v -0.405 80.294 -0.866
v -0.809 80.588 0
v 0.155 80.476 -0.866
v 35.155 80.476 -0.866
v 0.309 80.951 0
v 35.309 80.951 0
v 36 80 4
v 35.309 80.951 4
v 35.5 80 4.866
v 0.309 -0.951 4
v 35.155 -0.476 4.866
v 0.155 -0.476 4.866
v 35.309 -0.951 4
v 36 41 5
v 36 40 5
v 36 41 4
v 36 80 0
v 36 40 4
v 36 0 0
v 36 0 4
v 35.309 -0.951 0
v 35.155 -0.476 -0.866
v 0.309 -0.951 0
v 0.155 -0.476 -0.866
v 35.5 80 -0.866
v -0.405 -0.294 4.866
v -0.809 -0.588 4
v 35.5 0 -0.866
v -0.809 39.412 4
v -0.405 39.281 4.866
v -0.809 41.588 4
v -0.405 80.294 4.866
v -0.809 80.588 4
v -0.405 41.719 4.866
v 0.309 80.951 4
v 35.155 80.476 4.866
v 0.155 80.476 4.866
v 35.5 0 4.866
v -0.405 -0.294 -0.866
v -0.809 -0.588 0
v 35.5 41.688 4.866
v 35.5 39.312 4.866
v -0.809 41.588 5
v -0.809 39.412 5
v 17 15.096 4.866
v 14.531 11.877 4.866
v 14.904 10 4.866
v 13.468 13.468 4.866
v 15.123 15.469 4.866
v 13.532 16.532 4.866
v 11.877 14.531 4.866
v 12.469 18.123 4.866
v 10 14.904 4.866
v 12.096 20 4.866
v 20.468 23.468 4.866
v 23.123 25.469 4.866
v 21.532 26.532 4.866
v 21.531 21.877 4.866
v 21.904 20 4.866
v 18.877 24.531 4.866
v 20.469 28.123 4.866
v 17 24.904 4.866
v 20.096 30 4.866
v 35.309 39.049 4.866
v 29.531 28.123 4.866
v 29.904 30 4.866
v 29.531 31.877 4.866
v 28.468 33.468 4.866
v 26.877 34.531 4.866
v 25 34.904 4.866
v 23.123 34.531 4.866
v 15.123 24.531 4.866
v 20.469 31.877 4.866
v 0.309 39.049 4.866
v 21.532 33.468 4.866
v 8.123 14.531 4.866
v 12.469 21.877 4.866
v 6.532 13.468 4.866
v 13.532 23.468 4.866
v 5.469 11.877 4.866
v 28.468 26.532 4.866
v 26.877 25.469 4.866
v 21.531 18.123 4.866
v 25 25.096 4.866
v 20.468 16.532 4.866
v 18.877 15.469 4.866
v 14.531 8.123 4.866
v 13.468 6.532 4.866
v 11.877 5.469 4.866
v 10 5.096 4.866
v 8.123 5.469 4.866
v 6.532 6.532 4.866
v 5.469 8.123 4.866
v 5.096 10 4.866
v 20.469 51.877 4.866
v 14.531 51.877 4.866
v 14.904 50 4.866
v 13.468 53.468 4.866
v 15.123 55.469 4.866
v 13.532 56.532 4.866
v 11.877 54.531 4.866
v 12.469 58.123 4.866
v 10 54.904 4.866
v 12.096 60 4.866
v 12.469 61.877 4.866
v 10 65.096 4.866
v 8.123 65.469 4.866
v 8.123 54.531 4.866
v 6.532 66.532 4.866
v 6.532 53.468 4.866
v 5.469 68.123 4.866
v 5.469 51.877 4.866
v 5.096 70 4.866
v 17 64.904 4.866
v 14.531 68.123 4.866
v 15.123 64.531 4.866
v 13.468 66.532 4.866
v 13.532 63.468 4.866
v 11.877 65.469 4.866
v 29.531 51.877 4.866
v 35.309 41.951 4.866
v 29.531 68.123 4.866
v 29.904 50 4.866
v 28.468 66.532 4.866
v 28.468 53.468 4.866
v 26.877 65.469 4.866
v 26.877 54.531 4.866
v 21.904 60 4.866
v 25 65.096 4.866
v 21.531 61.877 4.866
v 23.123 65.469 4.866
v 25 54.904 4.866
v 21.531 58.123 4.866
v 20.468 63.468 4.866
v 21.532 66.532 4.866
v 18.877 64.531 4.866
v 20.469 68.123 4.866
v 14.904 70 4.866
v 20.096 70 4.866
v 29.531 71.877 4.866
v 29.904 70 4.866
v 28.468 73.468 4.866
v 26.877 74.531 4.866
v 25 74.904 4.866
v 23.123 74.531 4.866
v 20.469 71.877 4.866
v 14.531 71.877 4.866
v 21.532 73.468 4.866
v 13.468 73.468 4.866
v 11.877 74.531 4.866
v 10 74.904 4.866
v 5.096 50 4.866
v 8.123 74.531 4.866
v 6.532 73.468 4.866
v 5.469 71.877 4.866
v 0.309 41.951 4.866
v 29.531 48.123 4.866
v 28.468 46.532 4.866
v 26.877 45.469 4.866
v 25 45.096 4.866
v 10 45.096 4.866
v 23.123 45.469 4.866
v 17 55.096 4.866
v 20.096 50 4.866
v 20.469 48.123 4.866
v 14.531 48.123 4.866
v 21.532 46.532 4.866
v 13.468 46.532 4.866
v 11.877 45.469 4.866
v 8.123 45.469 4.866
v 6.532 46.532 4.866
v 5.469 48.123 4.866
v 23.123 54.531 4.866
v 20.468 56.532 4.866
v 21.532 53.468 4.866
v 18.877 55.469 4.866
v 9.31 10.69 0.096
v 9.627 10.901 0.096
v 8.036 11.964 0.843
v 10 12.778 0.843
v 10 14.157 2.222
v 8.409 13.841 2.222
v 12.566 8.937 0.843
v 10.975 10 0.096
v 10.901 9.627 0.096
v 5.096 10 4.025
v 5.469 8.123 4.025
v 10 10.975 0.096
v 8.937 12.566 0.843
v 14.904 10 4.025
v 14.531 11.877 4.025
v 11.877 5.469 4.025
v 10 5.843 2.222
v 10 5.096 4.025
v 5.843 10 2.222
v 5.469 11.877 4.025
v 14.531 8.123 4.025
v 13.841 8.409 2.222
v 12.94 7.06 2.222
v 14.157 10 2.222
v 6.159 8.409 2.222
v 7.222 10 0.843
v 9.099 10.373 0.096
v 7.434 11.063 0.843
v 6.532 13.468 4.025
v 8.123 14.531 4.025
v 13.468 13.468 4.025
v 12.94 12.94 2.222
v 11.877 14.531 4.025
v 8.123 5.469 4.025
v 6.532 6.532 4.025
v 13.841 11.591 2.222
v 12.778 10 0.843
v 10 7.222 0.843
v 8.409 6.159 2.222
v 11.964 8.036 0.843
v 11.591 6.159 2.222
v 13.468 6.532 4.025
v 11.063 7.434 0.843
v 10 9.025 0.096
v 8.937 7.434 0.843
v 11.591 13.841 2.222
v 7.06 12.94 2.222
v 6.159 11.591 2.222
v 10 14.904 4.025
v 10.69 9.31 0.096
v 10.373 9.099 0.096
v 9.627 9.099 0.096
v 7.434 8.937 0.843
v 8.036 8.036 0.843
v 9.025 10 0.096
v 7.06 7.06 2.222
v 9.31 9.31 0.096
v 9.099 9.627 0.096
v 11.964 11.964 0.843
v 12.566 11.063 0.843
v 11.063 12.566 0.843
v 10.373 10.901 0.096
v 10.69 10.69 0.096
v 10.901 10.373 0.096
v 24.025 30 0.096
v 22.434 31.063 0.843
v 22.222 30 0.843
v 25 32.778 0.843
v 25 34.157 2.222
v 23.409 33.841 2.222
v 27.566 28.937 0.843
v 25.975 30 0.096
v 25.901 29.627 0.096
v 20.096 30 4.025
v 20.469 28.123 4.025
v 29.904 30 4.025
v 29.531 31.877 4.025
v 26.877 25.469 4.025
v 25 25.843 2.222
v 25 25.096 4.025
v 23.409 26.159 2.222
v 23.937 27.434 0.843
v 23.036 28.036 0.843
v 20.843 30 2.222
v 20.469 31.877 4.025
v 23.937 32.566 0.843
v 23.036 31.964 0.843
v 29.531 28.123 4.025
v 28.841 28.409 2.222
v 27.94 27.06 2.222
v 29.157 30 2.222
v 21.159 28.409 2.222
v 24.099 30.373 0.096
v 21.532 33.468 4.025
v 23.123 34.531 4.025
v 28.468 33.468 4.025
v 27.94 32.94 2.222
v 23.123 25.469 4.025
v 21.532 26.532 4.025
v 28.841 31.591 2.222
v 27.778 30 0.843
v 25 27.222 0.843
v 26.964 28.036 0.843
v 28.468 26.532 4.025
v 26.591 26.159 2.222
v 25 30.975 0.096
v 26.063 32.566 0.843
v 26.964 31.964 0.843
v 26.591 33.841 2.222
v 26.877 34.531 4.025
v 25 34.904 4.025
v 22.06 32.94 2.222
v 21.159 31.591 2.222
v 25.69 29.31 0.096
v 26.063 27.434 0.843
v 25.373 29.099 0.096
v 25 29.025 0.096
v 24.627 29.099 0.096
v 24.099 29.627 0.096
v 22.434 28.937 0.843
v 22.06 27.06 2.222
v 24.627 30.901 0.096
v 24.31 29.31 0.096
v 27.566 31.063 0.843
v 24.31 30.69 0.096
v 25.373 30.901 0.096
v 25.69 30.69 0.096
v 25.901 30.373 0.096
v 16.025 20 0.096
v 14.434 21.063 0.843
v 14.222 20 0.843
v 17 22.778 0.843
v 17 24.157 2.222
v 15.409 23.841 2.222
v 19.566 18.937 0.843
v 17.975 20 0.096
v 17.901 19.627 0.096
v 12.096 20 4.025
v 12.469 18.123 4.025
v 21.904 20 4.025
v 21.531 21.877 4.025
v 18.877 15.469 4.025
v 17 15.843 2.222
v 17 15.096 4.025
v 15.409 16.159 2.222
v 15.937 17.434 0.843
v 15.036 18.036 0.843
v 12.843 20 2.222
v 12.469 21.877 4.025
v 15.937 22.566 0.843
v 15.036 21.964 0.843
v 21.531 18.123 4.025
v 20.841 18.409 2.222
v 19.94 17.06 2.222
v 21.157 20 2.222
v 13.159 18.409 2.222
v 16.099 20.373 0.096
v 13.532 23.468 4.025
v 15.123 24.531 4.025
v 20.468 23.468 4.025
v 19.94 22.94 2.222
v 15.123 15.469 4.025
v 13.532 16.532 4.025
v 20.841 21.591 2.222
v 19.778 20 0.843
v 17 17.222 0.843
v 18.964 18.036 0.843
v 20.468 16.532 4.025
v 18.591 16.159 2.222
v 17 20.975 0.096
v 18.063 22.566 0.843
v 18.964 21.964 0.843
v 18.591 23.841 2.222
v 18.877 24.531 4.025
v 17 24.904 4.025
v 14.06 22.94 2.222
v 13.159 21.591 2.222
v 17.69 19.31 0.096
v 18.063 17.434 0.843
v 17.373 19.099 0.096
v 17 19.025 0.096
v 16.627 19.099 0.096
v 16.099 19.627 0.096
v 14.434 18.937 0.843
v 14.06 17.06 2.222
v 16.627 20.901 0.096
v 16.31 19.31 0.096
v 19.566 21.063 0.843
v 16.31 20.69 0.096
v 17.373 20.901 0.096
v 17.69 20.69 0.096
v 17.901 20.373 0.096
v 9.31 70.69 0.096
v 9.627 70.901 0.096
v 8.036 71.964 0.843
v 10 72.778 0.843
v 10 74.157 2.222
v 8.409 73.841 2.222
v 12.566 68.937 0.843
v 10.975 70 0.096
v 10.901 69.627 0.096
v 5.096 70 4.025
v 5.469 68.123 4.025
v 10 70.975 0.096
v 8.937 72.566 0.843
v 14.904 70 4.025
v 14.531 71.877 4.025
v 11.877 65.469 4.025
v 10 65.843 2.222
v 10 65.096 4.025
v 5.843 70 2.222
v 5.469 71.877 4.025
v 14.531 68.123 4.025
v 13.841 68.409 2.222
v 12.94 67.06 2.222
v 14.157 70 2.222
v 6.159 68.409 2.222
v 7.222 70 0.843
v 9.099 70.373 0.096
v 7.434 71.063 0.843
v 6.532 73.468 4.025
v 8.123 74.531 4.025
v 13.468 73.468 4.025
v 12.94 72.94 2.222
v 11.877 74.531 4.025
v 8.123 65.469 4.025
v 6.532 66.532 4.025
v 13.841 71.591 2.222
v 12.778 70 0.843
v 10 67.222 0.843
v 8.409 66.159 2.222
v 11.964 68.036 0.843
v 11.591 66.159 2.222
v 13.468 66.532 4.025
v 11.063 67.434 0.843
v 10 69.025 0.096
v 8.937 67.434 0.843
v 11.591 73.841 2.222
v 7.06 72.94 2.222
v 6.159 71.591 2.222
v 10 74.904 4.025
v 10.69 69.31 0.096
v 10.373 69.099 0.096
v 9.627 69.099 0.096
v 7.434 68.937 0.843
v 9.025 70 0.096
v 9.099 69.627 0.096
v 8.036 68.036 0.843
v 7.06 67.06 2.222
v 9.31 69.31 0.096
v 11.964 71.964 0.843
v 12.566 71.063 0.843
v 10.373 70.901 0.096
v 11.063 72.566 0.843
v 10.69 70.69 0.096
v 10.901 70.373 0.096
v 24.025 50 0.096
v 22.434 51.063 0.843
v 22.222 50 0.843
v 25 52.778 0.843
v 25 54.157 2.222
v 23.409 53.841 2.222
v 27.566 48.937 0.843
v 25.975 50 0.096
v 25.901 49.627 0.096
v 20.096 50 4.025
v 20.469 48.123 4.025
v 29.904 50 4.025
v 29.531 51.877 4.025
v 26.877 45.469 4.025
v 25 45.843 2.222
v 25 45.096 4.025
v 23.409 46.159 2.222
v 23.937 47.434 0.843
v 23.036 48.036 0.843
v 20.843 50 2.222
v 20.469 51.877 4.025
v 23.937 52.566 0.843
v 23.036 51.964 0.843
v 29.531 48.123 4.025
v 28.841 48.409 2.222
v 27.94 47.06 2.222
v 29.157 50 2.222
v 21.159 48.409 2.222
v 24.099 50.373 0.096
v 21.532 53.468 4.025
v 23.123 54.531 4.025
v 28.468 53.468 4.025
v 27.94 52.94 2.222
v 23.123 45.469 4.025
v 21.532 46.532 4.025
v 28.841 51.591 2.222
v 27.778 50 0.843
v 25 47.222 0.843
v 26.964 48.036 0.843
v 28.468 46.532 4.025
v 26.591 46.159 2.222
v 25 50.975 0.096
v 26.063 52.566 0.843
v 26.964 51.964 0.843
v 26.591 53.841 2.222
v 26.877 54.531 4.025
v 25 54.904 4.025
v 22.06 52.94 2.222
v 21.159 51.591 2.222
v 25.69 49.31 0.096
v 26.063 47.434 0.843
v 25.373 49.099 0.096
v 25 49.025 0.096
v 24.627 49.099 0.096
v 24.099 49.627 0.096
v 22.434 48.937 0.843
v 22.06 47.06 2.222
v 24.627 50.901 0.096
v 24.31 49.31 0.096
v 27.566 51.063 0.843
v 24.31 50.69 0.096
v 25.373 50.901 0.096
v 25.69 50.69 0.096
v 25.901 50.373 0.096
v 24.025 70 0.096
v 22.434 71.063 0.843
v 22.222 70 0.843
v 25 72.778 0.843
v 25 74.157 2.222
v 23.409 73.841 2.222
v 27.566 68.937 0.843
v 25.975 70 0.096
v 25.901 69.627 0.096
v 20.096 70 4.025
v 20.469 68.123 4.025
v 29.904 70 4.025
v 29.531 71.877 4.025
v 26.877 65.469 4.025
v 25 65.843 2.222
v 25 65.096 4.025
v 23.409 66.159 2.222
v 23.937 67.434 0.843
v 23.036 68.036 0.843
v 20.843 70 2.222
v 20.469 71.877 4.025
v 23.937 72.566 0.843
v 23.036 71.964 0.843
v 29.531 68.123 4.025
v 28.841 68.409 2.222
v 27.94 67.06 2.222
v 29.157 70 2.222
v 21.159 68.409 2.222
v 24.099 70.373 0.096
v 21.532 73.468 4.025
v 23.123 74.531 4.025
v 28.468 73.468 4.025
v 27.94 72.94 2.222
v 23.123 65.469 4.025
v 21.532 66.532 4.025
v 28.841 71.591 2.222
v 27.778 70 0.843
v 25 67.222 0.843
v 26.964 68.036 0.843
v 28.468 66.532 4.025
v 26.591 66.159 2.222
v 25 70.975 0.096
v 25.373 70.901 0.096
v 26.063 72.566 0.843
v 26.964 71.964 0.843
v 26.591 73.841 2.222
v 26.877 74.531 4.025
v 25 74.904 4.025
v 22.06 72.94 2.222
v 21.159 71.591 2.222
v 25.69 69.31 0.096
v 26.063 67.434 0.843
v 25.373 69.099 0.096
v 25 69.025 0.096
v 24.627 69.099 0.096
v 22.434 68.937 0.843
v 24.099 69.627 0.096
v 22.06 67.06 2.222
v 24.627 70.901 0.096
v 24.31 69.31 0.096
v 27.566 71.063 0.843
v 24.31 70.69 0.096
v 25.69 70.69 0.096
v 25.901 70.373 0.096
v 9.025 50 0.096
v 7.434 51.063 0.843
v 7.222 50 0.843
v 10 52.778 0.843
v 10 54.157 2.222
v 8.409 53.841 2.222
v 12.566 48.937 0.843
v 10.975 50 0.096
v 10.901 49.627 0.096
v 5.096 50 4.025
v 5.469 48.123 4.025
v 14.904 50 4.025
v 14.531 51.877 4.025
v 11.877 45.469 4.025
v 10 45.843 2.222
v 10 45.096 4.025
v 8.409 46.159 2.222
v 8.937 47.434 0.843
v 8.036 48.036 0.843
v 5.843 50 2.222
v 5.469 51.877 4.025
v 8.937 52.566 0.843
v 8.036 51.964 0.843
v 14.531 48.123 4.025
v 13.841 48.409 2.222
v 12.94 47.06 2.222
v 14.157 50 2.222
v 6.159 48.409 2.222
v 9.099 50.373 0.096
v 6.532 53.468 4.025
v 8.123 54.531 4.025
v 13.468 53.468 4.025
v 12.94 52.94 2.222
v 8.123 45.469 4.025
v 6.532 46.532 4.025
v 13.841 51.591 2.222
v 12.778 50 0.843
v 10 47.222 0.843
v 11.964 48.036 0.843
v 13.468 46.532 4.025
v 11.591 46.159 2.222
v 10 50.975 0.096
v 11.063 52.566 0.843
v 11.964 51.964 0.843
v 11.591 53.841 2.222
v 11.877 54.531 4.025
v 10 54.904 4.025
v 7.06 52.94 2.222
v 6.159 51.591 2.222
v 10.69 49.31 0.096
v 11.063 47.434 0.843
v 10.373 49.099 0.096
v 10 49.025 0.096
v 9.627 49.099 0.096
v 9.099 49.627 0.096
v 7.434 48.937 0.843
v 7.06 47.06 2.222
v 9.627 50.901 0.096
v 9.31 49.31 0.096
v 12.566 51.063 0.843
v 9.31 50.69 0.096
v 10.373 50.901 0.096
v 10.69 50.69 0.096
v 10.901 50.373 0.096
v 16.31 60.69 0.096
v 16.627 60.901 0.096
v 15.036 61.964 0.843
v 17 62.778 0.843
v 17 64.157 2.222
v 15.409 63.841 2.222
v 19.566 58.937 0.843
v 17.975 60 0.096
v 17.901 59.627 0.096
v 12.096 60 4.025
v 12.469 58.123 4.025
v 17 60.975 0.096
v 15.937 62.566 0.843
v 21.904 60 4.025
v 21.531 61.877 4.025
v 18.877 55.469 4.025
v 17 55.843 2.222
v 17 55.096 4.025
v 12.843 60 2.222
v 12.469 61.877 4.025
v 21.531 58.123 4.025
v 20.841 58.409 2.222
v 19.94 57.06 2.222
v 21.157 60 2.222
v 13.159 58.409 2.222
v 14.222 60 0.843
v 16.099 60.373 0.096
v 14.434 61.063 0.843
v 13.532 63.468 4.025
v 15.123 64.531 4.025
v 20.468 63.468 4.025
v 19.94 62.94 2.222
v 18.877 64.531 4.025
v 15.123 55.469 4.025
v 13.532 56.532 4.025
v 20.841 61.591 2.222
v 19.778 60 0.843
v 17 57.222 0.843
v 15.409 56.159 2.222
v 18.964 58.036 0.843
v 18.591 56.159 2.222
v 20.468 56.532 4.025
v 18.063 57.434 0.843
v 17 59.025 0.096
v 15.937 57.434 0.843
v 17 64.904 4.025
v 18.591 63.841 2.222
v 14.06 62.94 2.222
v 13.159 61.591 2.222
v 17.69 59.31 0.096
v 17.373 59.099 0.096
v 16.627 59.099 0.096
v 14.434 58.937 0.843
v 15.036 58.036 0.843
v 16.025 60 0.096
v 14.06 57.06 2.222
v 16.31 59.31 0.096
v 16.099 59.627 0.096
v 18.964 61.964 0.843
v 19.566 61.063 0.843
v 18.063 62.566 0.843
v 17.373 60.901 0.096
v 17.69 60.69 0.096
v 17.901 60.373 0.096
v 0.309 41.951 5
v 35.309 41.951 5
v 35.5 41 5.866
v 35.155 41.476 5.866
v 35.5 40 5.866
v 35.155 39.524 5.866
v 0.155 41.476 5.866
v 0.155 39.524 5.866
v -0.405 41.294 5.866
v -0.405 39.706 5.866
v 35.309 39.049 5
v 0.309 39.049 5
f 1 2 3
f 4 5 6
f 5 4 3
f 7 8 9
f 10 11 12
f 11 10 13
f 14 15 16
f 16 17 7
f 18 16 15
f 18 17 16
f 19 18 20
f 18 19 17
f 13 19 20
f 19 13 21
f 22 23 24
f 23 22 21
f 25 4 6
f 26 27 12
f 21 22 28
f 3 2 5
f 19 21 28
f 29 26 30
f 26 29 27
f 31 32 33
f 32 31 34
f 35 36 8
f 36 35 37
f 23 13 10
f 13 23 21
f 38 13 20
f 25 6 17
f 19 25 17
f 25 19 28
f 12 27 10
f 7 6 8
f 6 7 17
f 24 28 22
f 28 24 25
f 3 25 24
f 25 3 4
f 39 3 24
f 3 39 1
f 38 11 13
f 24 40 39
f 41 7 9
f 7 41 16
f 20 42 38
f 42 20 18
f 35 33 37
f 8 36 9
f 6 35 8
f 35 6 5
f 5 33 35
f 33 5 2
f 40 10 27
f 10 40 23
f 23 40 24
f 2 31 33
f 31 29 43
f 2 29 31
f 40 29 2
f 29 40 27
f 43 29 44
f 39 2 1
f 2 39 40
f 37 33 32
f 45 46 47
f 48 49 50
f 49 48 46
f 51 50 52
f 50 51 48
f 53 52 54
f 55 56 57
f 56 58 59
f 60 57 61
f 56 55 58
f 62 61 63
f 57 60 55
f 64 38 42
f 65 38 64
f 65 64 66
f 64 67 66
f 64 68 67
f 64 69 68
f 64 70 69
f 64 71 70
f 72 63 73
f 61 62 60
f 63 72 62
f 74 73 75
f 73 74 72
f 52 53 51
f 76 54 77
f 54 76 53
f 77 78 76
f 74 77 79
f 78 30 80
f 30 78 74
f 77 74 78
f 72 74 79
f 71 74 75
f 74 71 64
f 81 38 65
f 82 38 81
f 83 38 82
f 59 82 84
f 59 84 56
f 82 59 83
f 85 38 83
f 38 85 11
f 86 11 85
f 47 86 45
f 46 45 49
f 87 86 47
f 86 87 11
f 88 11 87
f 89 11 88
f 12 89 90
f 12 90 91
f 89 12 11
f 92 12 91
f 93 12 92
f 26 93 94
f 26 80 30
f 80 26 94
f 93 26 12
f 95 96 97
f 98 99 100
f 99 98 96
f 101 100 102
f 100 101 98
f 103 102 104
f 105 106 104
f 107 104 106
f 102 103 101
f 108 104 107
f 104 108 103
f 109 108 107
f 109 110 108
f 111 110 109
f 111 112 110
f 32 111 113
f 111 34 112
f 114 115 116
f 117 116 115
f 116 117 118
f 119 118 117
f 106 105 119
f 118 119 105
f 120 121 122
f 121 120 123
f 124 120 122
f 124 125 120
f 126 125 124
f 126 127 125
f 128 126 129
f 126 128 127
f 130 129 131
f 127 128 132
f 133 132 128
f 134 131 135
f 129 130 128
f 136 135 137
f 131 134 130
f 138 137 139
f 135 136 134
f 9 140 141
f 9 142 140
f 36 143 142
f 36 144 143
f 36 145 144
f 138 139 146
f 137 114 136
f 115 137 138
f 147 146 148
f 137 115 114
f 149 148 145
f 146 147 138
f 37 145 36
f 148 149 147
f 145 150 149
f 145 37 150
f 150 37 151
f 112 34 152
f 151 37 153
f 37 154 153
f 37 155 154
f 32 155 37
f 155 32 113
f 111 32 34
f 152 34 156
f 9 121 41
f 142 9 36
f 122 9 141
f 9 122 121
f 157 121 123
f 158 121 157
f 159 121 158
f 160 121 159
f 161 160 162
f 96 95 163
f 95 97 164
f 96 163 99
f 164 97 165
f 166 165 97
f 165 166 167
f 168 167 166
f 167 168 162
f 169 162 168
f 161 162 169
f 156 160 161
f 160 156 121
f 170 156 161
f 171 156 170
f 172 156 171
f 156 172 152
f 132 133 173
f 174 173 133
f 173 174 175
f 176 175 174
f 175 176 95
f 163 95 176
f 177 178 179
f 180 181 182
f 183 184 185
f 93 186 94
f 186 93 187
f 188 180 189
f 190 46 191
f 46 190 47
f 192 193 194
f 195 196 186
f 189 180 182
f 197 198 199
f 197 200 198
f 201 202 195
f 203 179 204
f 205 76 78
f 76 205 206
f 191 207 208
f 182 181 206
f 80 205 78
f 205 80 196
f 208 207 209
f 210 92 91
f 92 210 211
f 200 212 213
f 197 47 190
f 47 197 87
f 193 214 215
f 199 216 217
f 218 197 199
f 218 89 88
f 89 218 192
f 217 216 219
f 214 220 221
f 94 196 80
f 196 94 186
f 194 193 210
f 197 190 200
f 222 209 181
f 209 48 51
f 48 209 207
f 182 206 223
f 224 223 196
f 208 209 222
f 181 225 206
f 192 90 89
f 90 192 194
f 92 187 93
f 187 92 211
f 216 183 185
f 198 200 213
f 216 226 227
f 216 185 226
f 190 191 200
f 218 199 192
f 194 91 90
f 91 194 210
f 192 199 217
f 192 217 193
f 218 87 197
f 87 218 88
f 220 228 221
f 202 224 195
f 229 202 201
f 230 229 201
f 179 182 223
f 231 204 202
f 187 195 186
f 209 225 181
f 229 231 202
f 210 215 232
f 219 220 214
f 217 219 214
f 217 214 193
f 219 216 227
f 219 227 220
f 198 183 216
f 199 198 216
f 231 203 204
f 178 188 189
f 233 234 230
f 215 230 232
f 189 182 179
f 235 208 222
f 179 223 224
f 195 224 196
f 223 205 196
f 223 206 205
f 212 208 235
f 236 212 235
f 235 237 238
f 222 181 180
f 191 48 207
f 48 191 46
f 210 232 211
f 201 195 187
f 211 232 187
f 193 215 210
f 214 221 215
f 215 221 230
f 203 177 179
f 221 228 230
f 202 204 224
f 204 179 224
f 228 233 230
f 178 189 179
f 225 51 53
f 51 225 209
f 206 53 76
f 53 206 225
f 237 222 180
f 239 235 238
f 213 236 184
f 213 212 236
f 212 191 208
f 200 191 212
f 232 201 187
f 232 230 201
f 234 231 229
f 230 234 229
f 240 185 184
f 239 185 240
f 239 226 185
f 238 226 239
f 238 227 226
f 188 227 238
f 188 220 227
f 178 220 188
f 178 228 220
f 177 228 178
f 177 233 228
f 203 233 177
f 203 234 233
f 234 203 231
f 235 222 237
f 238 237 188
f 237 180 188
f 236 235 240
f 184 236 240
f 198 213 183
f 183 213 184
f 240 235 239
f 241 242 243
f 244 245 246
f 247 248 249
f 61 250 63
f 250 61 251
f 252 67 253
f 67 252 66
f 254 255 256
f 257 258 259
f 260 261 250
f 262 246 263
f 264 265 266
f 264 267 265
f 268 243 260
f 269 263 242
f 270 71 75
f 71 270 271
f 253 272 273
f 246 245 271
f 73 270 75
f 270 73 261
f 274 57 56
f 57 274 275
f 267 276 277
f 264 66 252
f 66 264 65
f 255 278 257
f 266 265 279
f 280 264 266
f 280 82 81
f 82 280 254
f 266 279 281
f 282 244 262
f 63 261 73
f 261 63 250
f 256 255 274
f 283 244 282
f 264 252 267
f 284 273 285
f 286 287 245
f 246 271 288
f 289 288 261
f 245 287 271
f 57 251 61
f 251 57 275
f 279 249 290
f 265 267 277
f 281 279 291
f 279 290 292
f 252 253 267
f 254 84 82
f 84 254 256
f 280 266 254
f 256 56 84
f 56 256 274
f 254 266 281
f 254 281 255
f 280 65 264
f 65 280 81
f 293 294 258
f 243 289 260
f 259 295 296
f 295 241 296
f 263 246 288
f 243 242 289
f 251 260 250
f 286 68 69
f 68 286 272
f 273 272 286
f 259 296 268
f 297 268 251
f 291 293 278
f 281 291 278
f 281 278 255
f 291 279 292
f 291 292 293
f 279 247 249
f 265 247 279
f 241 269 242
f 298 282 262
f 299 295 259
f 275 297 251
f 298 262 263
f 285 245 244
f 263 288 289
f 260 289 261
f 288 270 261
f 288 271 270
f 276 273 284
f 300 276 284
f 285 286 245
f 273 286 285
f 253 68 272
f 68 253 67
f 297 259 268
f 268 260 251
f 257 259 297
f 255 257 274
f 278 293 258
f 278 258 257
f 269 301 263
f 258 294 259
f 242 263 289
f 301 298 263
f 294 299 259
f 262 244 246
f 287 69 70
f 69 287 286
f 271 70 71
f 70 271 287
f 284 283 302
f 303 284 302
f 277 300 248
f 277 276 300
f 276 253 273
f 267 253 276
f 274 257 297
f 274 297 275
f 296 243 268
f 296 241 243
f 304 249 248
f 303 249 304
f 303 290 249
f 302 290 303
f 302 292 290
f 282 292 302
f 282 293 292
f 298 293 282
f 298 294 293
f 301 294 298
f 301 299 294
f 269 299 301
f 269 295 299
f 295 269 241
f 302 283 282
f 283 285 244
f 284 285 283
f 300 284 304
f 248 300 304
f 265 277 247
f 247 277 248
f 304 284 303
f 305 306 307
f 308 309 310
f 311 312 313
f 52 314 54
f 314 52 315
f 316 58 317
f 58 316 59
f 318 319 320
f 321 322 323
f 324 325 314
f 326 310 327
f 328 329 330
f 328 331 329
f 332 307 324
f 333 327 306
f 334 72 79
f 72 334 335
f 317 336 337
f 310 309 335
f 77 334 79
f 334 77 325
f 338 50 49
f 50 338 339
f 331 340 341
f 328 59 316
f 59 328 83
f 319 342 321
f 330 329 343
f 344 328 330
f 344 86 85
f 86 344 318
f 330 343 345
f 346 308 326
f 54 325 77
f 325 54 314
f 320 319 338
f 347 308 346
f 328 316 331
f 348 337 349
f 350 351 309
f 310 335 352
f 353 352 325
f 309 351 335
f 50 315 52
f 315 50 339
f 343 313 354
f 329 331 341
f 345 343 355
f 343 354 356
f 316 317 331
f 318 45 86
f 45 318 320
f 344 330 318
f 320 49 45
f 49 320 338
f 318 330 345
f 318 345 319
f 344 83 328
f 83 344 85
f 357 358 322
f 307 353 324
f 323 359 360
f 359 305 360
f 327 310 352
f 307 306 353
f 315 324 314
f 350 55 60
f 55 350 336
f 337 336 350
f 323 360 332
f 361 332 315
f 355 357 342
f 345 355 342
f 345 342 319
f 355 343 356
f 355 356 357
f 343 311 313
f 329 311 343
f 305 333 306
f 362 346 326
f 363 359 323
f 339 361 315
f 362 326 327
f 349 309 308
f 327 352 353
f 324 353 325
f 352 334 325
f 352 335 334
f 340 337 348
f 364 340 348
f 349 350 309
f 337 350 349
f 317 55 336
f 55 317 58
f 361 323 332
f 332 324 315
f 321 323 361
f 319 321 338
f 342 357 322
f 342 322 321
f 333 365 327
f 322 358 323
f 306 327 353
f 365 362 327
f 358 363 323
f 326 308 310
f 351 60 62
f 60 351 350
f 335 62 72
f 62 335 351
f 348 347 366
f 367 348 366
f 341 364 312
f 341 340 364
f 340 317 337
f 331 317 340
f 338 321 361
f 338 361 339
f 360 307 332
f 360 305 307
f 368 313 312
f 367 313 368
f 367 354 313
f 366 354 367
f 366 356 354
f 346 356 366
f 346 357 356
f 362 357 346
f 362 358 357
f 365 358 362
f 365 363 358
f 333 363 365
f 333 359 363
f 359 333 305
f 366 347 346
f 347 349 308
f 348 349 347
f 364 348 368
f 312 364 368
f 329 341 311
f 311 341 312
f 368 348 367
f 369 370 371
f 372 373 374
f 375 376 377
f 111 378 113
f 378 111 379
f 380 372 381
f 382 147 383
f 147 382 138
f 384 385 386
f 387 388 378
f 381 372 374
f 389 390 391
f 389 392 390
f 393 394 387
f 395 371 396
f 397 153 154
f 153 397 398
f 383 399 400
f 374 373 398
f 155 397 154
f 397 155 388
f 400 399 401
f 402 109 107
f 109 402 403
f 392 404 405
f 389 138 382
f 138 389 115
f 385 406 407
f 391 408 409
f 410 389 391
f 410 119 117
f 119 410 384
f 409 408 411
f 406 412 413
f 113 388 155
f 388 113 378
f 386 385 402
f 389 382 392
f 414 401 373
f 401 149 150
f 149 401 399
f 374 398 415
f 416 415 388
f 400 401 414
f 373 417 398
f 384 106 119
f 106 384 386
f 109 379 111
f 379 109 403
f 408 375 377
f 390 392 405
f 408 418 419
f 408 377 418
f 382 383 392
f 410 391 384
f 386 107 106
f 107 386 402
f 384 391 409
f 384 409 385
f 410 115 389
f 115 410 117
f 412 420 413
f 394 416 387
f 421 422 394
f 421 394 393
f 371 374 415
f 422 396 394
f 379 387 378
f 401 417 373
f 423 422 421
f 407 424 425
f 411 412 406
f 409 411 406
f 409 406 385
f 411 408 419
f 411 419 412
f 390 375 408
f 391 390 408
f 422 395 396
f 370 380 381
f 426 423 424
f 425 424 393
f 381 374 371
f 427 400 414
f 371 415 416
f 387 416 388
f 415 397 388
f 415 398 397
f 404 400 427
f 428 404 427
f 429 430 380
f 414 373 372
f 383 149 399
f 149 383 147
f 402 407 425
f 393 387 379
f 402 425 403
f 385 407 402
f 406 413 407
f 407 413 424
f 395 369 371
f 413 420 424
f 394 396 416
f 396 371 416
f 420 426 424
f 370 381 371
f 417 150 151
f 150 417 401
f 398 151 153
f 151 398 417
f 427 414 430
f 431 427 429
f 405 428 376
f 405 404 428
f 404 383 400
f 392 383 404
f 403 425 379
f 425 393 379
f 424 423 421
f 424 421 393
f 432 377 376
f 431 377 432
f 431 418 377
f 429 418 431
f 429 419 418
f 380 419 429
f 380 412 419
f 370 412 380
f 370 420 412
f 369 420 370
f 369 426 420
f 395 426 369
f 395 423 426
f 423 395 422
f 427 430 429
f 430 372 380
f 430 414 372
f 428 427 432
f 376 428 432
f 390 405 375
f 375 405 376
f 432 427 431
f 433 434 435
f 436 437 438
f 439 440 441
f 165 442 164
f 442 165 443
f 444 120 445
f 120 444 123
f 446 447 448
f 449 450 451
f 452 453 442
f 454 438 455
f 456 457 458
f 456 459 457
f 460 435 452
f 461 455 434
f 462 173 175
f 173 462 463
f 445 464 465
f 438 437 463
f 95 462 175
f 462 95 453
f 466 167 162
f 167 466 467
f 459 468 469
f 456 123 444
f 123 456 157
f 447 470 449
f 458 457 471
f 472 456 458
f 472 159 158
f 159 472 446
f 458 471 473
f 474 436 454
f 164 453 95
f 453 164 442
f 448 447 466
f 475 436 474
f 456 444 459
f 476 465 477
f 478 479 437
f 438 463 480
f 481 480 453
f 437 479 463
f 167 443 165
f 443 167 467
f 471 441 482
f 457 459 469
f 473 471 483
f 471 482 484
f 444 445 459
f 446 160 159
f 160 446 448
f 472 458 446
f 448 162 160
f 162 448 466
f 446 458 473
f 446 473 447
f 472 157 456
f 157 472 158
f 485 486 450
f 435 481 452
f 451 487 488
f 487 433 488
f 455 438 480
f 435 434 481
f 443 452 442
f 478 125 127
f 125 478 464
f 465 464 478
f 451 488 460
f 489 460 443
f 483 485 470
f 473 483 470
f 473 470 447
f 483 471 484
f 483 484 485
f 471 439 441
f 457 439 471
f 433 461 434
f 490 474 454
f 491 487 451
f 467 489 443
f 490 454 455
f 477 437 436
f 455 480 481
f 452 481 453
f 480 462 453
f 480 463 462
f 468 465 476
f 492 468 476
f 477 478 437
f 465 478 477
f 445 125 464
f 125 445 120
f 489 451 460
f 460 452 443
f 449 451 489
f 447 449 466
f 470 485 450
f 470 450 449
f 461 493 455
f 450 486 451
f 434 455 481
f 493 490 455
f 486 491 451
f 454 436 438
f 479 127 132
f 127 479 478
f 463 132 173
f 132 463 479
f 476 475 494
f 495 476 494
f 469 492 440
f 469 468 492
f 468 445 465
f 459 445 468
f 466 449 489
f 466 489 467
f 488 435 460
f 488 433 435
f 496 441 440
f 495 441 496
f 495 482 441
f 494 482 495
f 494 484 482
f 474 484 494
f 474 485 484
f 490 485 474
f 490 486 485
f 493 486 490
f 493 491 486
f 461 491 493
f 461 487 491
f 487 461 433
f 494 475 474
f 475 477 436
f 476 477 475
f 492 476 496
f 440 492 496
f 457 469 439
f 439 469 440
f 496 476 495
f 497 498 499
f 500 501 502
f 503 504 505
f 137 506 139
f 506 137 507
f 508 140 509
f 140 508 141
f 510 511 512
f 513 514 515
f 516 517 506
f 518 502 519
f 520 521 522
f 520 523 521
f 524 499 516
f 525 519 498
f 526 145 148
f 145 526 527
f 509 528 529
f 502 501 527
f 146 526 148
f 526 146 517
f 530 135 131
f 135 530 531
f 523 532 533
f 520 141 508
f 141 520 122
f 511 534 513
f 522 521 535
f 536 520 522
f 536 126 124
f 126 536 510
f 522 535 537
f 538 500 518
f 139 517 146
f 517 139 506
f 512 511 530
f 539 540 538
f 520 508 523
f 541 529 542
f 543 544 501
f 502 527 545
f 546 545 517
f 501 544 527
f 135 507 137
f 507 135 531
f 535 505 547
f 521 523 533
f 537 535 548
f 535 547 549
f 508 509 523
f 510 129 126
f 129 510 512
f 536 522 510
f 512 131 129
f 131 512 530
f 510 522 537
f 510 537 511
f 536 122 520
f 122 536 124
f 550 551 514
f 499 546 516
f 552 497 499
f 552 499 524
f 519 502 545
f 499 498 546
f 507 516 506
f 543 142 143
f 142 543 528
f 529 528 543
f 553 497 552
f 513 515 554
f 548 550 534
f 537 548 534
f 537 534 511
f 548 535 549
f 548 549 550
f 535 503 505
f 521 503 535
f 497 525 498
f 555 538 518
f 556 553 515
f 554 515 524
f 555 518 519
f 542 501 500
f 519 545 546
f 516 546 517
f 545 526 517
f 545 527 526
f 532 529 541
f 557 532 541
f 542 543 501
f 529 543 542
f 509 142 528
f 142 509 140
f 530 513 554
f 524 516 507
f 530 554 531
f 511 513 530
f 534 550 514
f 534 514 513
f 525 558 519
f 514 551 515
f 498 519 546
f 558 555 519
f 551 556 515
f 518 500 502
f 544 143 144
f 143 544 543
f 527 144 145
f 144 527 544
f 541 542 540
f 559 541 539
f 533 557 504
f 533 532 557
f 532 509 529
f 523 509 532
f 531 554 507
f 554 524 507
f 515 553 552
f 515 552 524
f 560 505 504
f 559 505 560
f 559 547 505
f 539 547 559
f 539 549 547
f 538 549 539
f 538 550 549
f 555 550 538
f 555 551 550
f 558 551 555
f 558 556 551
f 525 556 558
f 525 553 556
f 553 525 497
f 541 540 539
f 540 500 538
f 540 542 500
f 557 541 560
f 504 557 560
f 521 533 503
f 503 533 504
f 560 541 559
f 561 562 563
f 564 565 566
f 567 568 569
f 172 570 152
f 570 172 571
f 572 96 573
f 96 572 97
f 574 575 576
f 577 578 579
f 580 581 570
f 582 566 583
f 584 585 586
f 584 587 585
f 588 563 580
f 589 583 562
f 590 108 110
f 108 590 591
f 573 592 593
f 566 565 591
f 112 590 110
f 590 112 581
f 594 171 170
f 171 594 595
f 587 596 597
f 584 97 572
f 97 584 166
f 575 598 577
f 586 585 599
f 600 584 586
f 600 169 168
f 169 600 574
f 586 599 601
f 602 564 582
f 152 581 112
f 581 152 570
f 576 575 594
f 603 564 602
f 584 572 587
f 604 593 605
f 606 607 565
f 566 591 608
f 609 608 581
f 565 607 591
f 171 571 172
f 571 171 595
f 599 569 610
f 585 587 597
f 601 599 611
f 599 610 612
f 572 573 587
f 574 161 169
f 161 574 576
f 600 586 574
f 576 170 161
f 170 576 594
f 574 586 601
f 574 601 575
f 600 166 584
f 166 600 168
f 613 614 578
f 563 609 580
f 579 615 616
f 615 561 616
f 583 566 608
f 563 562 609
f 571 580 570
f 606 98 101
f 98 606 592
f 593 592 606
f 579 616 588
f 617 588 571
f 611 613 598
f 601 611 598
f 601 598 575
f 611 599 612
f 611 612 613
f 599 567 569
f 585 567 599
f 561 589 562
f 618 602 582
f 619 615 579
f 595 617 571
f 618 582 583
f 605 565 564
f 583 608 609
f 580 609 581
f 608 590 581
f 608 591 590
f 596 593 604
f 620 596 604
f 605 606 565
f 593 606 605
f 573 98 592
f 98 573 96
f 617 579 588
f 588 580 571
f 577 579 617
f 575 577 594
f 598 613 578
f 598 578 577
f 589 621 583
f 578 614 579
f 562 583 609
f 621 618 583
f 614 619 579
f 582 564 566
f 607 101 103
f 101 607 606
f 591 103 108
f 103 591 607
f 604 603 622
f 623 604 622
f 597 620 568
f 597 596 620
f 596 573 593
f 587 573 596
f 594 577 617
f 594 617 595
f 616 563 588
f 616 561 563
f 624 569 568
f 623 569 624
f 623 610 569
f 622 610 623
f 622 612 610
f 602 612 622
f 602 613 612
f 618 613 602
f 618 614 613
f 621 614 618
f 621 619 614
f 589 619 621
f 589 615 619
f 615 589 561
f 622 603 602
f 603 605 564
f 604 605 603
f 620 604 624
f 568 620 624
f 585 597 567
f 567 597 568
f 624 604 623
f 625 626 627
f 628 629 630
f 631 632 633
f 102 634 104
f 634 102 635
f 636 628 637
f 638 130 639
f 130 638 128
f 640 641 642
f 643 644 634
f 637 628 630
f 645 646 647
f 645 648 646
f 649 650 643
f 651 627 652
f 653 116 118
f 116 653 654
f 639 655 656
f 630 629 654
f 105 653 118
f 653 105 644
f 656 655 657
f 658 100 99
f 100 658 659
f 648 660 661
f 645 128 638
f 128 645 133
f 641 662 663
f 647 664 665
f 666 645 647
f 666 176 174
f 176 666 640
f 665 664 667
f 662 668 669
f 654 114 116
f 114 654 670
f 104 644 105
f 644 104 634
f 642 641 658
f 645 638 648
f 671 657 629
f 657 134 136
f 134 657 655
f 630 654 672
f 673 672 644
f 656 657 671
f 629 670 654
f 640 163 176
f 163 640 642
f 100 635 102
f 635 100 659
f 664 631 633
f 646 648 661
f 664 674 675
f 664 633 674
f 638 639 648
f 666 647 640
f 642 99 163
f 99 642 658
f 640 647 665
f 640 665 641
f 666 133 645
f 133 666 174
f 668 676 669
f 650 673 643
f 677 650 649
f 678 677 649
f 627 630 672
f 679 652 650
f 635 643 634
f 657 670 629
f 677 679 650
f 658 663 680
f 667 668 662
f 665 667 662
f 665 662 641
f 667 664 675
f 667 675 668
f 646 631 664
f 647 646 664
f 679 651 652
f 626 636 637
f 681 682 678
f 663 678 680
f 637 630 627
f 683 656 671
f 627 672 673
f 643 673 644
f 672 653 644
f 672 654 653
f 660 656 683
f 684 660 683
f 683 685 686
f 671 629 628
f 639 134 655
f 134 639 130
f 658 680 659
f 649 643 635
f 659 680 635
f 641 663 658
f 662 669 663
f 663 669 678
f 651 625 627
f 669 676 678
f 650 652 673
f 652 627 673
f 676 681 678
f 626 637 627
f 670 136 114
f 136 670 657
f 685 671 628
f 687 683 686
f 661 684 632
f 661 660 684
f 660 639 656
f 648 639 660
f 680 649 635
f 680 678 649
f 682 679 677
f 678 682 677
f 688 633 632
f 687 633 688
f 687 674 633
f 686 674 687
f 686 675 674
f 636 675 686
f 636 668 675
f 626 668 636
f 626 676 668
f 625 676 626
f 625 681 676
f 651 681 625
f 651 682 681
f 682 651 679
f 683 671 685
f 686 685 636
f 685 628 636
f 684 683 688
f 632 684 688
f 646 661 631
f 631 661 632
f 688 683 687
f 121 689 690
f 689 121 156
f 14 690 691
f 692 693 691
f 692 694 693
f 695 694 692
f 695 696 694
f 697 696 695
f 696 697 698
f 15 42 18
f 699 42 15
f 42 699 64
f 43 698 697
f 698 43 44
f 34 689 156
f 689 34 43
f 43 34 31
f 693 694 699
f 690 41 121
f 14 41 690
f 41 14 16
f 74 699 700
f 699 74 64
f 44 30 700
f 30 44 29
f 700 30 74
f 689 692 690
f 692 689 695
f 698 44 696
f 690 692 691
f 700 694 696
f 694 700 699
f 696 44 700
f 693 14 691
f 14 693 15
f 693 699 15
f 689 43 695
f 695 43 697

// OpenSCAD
// Loguncov Maxim 13.12.13


//$fn=128;


translate([0,40,0])
minkowski()
{cube([35,1,5]);
sphere(1);
}

difference() {

//основа
minkowski()
{cube([35,80,4]);
sphere(1);
}

//отверстия
translate([10,10,5])sphere(5);
translate([25,30,5])sphere(5);
translate([17,20,5])sphere(5);

translate([10,70,5])sphere(5);
translate([25,50,5])sphere(5);
translate([25,70,5])sphere(5);
translate([10,50,5])sphere(5);
translate([17,60,5])sphere(5);
}
